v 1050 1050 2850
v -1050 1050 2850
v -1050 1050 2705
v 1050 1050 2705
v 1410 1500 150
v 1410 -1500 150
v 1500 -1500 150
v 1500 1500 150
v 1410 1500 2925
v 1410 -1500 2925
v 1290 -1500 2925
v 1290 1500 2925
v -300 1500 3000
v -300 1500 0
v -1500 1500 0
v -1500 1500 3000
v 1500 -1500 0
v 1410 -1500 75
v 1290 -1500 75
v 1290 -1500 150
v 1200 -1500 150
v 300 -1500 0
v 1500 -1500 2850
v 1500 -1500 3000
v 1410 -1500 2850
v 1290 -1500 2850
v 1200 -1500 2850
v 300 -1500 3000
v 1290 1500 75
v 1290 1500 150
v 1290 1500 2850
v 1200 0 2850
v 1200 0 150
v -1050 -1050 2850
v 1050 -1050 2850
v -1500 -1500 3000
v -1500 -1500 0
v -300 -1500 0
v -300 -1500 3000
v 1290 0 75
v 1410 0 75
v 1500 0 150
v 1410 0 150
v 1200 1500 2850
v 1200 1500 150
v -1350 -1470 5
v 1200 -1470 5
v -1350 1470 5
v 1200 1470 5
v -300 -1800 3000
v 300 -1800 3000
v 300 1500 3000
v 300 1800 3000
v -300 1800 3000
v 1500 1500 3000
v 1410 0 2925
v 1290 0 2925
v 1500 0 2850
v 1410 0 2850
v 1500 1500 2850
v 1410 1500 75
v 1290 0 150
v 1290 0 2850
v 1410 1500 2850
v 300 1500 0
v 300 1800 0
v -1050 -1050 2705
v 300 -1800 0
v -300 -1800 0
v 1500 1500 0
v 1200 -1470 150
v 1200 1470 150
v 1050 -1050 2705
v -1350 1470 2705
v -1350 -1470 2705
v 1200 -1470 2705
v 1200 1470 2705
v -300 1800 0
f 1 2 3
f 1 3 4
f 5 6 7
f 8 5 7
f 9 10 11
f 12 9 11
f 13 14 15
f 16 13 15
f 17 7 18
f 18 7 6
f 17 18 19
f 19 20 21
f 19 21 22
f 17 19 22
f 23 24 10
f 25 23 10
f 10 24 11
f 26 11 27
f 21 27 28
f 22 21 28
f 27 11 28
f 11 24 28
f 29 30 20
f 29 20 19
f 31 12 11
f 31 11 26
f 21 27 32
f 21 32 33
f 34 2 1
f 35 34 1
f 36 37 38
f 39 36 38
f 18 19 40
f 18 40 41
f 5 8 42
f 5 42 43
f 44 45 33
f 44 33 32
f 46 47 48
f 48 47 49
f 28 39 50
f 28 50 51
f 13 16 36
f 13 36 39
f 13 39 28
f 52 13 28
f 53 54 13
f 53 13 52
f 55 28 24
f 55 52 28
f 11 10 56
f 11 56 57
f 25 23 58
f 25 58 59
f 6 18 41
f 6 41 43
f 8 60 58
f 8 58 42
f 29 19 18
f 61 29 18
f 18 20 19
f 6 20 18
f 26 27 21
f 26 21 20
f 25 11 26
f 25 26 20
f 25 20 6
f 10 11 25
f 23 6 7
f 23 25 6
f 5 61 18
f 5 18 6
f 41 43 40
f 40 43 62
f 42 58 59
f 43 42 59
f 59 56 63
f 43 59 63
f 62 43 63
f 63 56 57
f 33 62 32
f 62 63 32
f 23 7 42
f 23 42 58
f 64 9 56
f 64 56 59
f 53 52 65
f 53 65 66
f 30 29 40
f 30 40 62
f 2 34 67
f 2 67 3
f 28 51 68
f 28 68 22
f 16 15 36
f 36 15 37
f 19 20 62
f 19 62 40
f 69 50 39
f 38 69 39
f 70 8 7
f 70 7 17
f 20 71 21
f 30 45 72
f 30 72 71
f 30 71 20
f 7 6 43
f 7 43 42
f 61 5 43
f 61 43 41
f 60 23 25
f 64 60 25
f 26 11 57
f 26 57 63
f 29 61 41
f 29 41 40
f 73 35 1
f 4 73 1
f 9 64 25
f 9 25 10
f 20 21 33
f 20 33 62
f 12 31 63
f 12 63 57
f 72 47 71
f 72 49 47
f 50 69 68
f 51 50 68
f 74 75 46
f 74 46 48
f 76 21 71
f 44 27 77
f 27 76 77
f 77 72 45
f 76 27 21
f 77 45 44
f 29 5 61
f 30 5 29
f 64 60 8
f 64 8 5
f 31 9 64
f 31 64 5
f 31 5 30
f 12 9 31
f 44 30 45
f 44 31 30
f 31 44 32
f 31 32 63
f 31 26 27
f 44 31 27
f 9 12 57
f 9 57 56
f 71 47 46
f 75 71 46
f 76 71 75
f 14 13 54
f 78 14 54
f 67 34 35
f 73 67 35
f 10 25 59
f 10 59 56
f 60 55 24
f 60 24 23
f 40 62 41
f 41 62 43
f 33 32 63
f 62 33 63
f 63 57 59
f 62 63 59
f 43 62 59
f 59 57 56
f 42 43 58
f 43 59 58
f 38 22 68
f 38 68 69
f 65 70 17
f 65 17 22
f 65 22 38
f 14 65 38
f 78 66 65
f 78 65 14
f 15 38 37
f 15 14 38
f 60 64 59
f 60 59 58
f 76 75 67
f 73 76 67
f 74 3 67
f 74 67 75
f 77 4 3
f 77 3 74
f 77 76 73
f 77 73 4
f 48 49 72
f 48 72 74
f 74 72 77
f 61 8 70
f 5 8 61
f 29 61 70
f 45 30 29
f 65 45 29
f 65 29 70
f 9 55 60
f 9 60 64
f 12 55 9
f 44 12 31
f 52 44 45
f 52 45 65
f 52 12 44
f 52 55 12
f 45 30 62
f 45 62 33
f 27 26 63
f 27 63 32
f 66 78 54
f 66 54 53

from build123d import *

# Parameters (mm, degrees)
F0_W      = 600
F0_H      = 300
F1_DEPTH  = 3000
F2_W      = 2100
F2_H      = 2100
F3_DEPTH  = 3000
F4_W      = 2100
F4_H      = 2100
F5_DEPTH  = 150
F6_W      = 2100
F6_H      = 2100
F7_DEPTH  = 150
F9_DEPTH  = 3000
F10_W     = 2940
F10_H     = 2700
F11_DEPTH = 2550
F13_DEPTH = 3000
F15_DEPTH = 1500
F17_DEPTH = 1500


with BuildPart() as f1:
    # F0 (on Top) → F1 (new body)
    with BuildSketch(Plane.XY):
        Polygon((-300, 1500), (-1500, 1500), (-1500, -1500), (-300, -1500), (300, -1500), (1200, -1500), (1200, 1500), (300, 1500), align=None)
        with Locations((0, 1650)):
            Rectangle(F0_W, F0_H)
        with Locations((0, -1650)):
            Rectangle(F0_W, F0_H)
    extrude(amount=F1_DEPTH)

    # F2 (on face) → F3 (cut)
    with BuildSketch(Plane.XY.offset(3000)):
        Rectangle(F2_W, F2_H)
    extrude(amount=-F3_DEPTH, mode=Mode.SUBTRACT)

    # F4 (on Top) → F5 (join)
    with BuildSketch(Plane.XY):
        Rectangle(F4_W, F4_H)
    extrude(amount=F5_DEPTH)

    # F6 (on face) → F7 (join)
    with BuildSketch(Plane.XY.offset(3000)):
        Rectangle(F6_W, F6_H)
    extrude(amount=-F7_DEPTH)

    # F8 (on face) → F9 (join)
    with BuildSketch(Plane(origin=(0, 1500, 0), x_dir=(-1, 0, 0), z_dir=(0, 1, 0))):
        Polygon((-1200, 2850), (-1200, 3000), (-1500, 3000), (-1500, 2850), (-1410, 2850), (-1410, 2925), (-1290, 2925), (-1290, 2850), align=None)
    extrude(amount=-F9_DEPTH)

    # F10 (on face) → F11 (cut)
    with BuildSketch(Plane.YZ.offset(1200)):
        with Locations((0, 1355)):
            Rectangle(F10_W, F10_H)
    extrude(amount=-F11_DEPTH, mode=Mode.SUBTRACT)

    # F12 (on face) → F13 (join)
    with BuildSketch(Plane(origin=(0, 1500, 0), x_dir=(-1, 0, 0), z_dir=(0, 1, 0))):
        Polygon((-1500, 0), (-1200, 0), (-1200, 150), (-1290, 150), (-1290, 75), (-1410, 75), (-1410, 150), (-1500, 150), align=None)
    extrude(amount=-F13_DEPTH)


with BuildPart() as f15:
    # F14 (on face) → F15 (new body)
    with BuildSketch(Plane(origin=(0, 1500, 0), x_dir=(-1, 0, 0), z_dir=(0, 1, 0))):
        Polygon((-1410, 2850), (-1500, 2850), (-1500, 150), (-1410, 150), (-1410, 75), (-1290, 75), (-1290, 150), (-1200, 150), (-1200, 2850), (-1290, 2850), (-1290, 2925), (-1410, 2925), align=None)
    extrude(amount=-F15_DEPTH)


with BuildPart() as f17:
    # F16 (on face) → F17 (new body)
    with BuildSketch(Plane.XZ.offset(1500)):
        Polygon((1290, 2850), (1200, 2850), (1200, 150), (1290, 150), (1290, 75), (1410, 75), (1410, 150), (1500, 150), (1500, 2850), (1410, 2850), (1410, 2925), (1290, 2925), align=None)
    extrude(amount=-F17_DEPTH)


solid = Compound([f1.part, f15.part, f17.part])
